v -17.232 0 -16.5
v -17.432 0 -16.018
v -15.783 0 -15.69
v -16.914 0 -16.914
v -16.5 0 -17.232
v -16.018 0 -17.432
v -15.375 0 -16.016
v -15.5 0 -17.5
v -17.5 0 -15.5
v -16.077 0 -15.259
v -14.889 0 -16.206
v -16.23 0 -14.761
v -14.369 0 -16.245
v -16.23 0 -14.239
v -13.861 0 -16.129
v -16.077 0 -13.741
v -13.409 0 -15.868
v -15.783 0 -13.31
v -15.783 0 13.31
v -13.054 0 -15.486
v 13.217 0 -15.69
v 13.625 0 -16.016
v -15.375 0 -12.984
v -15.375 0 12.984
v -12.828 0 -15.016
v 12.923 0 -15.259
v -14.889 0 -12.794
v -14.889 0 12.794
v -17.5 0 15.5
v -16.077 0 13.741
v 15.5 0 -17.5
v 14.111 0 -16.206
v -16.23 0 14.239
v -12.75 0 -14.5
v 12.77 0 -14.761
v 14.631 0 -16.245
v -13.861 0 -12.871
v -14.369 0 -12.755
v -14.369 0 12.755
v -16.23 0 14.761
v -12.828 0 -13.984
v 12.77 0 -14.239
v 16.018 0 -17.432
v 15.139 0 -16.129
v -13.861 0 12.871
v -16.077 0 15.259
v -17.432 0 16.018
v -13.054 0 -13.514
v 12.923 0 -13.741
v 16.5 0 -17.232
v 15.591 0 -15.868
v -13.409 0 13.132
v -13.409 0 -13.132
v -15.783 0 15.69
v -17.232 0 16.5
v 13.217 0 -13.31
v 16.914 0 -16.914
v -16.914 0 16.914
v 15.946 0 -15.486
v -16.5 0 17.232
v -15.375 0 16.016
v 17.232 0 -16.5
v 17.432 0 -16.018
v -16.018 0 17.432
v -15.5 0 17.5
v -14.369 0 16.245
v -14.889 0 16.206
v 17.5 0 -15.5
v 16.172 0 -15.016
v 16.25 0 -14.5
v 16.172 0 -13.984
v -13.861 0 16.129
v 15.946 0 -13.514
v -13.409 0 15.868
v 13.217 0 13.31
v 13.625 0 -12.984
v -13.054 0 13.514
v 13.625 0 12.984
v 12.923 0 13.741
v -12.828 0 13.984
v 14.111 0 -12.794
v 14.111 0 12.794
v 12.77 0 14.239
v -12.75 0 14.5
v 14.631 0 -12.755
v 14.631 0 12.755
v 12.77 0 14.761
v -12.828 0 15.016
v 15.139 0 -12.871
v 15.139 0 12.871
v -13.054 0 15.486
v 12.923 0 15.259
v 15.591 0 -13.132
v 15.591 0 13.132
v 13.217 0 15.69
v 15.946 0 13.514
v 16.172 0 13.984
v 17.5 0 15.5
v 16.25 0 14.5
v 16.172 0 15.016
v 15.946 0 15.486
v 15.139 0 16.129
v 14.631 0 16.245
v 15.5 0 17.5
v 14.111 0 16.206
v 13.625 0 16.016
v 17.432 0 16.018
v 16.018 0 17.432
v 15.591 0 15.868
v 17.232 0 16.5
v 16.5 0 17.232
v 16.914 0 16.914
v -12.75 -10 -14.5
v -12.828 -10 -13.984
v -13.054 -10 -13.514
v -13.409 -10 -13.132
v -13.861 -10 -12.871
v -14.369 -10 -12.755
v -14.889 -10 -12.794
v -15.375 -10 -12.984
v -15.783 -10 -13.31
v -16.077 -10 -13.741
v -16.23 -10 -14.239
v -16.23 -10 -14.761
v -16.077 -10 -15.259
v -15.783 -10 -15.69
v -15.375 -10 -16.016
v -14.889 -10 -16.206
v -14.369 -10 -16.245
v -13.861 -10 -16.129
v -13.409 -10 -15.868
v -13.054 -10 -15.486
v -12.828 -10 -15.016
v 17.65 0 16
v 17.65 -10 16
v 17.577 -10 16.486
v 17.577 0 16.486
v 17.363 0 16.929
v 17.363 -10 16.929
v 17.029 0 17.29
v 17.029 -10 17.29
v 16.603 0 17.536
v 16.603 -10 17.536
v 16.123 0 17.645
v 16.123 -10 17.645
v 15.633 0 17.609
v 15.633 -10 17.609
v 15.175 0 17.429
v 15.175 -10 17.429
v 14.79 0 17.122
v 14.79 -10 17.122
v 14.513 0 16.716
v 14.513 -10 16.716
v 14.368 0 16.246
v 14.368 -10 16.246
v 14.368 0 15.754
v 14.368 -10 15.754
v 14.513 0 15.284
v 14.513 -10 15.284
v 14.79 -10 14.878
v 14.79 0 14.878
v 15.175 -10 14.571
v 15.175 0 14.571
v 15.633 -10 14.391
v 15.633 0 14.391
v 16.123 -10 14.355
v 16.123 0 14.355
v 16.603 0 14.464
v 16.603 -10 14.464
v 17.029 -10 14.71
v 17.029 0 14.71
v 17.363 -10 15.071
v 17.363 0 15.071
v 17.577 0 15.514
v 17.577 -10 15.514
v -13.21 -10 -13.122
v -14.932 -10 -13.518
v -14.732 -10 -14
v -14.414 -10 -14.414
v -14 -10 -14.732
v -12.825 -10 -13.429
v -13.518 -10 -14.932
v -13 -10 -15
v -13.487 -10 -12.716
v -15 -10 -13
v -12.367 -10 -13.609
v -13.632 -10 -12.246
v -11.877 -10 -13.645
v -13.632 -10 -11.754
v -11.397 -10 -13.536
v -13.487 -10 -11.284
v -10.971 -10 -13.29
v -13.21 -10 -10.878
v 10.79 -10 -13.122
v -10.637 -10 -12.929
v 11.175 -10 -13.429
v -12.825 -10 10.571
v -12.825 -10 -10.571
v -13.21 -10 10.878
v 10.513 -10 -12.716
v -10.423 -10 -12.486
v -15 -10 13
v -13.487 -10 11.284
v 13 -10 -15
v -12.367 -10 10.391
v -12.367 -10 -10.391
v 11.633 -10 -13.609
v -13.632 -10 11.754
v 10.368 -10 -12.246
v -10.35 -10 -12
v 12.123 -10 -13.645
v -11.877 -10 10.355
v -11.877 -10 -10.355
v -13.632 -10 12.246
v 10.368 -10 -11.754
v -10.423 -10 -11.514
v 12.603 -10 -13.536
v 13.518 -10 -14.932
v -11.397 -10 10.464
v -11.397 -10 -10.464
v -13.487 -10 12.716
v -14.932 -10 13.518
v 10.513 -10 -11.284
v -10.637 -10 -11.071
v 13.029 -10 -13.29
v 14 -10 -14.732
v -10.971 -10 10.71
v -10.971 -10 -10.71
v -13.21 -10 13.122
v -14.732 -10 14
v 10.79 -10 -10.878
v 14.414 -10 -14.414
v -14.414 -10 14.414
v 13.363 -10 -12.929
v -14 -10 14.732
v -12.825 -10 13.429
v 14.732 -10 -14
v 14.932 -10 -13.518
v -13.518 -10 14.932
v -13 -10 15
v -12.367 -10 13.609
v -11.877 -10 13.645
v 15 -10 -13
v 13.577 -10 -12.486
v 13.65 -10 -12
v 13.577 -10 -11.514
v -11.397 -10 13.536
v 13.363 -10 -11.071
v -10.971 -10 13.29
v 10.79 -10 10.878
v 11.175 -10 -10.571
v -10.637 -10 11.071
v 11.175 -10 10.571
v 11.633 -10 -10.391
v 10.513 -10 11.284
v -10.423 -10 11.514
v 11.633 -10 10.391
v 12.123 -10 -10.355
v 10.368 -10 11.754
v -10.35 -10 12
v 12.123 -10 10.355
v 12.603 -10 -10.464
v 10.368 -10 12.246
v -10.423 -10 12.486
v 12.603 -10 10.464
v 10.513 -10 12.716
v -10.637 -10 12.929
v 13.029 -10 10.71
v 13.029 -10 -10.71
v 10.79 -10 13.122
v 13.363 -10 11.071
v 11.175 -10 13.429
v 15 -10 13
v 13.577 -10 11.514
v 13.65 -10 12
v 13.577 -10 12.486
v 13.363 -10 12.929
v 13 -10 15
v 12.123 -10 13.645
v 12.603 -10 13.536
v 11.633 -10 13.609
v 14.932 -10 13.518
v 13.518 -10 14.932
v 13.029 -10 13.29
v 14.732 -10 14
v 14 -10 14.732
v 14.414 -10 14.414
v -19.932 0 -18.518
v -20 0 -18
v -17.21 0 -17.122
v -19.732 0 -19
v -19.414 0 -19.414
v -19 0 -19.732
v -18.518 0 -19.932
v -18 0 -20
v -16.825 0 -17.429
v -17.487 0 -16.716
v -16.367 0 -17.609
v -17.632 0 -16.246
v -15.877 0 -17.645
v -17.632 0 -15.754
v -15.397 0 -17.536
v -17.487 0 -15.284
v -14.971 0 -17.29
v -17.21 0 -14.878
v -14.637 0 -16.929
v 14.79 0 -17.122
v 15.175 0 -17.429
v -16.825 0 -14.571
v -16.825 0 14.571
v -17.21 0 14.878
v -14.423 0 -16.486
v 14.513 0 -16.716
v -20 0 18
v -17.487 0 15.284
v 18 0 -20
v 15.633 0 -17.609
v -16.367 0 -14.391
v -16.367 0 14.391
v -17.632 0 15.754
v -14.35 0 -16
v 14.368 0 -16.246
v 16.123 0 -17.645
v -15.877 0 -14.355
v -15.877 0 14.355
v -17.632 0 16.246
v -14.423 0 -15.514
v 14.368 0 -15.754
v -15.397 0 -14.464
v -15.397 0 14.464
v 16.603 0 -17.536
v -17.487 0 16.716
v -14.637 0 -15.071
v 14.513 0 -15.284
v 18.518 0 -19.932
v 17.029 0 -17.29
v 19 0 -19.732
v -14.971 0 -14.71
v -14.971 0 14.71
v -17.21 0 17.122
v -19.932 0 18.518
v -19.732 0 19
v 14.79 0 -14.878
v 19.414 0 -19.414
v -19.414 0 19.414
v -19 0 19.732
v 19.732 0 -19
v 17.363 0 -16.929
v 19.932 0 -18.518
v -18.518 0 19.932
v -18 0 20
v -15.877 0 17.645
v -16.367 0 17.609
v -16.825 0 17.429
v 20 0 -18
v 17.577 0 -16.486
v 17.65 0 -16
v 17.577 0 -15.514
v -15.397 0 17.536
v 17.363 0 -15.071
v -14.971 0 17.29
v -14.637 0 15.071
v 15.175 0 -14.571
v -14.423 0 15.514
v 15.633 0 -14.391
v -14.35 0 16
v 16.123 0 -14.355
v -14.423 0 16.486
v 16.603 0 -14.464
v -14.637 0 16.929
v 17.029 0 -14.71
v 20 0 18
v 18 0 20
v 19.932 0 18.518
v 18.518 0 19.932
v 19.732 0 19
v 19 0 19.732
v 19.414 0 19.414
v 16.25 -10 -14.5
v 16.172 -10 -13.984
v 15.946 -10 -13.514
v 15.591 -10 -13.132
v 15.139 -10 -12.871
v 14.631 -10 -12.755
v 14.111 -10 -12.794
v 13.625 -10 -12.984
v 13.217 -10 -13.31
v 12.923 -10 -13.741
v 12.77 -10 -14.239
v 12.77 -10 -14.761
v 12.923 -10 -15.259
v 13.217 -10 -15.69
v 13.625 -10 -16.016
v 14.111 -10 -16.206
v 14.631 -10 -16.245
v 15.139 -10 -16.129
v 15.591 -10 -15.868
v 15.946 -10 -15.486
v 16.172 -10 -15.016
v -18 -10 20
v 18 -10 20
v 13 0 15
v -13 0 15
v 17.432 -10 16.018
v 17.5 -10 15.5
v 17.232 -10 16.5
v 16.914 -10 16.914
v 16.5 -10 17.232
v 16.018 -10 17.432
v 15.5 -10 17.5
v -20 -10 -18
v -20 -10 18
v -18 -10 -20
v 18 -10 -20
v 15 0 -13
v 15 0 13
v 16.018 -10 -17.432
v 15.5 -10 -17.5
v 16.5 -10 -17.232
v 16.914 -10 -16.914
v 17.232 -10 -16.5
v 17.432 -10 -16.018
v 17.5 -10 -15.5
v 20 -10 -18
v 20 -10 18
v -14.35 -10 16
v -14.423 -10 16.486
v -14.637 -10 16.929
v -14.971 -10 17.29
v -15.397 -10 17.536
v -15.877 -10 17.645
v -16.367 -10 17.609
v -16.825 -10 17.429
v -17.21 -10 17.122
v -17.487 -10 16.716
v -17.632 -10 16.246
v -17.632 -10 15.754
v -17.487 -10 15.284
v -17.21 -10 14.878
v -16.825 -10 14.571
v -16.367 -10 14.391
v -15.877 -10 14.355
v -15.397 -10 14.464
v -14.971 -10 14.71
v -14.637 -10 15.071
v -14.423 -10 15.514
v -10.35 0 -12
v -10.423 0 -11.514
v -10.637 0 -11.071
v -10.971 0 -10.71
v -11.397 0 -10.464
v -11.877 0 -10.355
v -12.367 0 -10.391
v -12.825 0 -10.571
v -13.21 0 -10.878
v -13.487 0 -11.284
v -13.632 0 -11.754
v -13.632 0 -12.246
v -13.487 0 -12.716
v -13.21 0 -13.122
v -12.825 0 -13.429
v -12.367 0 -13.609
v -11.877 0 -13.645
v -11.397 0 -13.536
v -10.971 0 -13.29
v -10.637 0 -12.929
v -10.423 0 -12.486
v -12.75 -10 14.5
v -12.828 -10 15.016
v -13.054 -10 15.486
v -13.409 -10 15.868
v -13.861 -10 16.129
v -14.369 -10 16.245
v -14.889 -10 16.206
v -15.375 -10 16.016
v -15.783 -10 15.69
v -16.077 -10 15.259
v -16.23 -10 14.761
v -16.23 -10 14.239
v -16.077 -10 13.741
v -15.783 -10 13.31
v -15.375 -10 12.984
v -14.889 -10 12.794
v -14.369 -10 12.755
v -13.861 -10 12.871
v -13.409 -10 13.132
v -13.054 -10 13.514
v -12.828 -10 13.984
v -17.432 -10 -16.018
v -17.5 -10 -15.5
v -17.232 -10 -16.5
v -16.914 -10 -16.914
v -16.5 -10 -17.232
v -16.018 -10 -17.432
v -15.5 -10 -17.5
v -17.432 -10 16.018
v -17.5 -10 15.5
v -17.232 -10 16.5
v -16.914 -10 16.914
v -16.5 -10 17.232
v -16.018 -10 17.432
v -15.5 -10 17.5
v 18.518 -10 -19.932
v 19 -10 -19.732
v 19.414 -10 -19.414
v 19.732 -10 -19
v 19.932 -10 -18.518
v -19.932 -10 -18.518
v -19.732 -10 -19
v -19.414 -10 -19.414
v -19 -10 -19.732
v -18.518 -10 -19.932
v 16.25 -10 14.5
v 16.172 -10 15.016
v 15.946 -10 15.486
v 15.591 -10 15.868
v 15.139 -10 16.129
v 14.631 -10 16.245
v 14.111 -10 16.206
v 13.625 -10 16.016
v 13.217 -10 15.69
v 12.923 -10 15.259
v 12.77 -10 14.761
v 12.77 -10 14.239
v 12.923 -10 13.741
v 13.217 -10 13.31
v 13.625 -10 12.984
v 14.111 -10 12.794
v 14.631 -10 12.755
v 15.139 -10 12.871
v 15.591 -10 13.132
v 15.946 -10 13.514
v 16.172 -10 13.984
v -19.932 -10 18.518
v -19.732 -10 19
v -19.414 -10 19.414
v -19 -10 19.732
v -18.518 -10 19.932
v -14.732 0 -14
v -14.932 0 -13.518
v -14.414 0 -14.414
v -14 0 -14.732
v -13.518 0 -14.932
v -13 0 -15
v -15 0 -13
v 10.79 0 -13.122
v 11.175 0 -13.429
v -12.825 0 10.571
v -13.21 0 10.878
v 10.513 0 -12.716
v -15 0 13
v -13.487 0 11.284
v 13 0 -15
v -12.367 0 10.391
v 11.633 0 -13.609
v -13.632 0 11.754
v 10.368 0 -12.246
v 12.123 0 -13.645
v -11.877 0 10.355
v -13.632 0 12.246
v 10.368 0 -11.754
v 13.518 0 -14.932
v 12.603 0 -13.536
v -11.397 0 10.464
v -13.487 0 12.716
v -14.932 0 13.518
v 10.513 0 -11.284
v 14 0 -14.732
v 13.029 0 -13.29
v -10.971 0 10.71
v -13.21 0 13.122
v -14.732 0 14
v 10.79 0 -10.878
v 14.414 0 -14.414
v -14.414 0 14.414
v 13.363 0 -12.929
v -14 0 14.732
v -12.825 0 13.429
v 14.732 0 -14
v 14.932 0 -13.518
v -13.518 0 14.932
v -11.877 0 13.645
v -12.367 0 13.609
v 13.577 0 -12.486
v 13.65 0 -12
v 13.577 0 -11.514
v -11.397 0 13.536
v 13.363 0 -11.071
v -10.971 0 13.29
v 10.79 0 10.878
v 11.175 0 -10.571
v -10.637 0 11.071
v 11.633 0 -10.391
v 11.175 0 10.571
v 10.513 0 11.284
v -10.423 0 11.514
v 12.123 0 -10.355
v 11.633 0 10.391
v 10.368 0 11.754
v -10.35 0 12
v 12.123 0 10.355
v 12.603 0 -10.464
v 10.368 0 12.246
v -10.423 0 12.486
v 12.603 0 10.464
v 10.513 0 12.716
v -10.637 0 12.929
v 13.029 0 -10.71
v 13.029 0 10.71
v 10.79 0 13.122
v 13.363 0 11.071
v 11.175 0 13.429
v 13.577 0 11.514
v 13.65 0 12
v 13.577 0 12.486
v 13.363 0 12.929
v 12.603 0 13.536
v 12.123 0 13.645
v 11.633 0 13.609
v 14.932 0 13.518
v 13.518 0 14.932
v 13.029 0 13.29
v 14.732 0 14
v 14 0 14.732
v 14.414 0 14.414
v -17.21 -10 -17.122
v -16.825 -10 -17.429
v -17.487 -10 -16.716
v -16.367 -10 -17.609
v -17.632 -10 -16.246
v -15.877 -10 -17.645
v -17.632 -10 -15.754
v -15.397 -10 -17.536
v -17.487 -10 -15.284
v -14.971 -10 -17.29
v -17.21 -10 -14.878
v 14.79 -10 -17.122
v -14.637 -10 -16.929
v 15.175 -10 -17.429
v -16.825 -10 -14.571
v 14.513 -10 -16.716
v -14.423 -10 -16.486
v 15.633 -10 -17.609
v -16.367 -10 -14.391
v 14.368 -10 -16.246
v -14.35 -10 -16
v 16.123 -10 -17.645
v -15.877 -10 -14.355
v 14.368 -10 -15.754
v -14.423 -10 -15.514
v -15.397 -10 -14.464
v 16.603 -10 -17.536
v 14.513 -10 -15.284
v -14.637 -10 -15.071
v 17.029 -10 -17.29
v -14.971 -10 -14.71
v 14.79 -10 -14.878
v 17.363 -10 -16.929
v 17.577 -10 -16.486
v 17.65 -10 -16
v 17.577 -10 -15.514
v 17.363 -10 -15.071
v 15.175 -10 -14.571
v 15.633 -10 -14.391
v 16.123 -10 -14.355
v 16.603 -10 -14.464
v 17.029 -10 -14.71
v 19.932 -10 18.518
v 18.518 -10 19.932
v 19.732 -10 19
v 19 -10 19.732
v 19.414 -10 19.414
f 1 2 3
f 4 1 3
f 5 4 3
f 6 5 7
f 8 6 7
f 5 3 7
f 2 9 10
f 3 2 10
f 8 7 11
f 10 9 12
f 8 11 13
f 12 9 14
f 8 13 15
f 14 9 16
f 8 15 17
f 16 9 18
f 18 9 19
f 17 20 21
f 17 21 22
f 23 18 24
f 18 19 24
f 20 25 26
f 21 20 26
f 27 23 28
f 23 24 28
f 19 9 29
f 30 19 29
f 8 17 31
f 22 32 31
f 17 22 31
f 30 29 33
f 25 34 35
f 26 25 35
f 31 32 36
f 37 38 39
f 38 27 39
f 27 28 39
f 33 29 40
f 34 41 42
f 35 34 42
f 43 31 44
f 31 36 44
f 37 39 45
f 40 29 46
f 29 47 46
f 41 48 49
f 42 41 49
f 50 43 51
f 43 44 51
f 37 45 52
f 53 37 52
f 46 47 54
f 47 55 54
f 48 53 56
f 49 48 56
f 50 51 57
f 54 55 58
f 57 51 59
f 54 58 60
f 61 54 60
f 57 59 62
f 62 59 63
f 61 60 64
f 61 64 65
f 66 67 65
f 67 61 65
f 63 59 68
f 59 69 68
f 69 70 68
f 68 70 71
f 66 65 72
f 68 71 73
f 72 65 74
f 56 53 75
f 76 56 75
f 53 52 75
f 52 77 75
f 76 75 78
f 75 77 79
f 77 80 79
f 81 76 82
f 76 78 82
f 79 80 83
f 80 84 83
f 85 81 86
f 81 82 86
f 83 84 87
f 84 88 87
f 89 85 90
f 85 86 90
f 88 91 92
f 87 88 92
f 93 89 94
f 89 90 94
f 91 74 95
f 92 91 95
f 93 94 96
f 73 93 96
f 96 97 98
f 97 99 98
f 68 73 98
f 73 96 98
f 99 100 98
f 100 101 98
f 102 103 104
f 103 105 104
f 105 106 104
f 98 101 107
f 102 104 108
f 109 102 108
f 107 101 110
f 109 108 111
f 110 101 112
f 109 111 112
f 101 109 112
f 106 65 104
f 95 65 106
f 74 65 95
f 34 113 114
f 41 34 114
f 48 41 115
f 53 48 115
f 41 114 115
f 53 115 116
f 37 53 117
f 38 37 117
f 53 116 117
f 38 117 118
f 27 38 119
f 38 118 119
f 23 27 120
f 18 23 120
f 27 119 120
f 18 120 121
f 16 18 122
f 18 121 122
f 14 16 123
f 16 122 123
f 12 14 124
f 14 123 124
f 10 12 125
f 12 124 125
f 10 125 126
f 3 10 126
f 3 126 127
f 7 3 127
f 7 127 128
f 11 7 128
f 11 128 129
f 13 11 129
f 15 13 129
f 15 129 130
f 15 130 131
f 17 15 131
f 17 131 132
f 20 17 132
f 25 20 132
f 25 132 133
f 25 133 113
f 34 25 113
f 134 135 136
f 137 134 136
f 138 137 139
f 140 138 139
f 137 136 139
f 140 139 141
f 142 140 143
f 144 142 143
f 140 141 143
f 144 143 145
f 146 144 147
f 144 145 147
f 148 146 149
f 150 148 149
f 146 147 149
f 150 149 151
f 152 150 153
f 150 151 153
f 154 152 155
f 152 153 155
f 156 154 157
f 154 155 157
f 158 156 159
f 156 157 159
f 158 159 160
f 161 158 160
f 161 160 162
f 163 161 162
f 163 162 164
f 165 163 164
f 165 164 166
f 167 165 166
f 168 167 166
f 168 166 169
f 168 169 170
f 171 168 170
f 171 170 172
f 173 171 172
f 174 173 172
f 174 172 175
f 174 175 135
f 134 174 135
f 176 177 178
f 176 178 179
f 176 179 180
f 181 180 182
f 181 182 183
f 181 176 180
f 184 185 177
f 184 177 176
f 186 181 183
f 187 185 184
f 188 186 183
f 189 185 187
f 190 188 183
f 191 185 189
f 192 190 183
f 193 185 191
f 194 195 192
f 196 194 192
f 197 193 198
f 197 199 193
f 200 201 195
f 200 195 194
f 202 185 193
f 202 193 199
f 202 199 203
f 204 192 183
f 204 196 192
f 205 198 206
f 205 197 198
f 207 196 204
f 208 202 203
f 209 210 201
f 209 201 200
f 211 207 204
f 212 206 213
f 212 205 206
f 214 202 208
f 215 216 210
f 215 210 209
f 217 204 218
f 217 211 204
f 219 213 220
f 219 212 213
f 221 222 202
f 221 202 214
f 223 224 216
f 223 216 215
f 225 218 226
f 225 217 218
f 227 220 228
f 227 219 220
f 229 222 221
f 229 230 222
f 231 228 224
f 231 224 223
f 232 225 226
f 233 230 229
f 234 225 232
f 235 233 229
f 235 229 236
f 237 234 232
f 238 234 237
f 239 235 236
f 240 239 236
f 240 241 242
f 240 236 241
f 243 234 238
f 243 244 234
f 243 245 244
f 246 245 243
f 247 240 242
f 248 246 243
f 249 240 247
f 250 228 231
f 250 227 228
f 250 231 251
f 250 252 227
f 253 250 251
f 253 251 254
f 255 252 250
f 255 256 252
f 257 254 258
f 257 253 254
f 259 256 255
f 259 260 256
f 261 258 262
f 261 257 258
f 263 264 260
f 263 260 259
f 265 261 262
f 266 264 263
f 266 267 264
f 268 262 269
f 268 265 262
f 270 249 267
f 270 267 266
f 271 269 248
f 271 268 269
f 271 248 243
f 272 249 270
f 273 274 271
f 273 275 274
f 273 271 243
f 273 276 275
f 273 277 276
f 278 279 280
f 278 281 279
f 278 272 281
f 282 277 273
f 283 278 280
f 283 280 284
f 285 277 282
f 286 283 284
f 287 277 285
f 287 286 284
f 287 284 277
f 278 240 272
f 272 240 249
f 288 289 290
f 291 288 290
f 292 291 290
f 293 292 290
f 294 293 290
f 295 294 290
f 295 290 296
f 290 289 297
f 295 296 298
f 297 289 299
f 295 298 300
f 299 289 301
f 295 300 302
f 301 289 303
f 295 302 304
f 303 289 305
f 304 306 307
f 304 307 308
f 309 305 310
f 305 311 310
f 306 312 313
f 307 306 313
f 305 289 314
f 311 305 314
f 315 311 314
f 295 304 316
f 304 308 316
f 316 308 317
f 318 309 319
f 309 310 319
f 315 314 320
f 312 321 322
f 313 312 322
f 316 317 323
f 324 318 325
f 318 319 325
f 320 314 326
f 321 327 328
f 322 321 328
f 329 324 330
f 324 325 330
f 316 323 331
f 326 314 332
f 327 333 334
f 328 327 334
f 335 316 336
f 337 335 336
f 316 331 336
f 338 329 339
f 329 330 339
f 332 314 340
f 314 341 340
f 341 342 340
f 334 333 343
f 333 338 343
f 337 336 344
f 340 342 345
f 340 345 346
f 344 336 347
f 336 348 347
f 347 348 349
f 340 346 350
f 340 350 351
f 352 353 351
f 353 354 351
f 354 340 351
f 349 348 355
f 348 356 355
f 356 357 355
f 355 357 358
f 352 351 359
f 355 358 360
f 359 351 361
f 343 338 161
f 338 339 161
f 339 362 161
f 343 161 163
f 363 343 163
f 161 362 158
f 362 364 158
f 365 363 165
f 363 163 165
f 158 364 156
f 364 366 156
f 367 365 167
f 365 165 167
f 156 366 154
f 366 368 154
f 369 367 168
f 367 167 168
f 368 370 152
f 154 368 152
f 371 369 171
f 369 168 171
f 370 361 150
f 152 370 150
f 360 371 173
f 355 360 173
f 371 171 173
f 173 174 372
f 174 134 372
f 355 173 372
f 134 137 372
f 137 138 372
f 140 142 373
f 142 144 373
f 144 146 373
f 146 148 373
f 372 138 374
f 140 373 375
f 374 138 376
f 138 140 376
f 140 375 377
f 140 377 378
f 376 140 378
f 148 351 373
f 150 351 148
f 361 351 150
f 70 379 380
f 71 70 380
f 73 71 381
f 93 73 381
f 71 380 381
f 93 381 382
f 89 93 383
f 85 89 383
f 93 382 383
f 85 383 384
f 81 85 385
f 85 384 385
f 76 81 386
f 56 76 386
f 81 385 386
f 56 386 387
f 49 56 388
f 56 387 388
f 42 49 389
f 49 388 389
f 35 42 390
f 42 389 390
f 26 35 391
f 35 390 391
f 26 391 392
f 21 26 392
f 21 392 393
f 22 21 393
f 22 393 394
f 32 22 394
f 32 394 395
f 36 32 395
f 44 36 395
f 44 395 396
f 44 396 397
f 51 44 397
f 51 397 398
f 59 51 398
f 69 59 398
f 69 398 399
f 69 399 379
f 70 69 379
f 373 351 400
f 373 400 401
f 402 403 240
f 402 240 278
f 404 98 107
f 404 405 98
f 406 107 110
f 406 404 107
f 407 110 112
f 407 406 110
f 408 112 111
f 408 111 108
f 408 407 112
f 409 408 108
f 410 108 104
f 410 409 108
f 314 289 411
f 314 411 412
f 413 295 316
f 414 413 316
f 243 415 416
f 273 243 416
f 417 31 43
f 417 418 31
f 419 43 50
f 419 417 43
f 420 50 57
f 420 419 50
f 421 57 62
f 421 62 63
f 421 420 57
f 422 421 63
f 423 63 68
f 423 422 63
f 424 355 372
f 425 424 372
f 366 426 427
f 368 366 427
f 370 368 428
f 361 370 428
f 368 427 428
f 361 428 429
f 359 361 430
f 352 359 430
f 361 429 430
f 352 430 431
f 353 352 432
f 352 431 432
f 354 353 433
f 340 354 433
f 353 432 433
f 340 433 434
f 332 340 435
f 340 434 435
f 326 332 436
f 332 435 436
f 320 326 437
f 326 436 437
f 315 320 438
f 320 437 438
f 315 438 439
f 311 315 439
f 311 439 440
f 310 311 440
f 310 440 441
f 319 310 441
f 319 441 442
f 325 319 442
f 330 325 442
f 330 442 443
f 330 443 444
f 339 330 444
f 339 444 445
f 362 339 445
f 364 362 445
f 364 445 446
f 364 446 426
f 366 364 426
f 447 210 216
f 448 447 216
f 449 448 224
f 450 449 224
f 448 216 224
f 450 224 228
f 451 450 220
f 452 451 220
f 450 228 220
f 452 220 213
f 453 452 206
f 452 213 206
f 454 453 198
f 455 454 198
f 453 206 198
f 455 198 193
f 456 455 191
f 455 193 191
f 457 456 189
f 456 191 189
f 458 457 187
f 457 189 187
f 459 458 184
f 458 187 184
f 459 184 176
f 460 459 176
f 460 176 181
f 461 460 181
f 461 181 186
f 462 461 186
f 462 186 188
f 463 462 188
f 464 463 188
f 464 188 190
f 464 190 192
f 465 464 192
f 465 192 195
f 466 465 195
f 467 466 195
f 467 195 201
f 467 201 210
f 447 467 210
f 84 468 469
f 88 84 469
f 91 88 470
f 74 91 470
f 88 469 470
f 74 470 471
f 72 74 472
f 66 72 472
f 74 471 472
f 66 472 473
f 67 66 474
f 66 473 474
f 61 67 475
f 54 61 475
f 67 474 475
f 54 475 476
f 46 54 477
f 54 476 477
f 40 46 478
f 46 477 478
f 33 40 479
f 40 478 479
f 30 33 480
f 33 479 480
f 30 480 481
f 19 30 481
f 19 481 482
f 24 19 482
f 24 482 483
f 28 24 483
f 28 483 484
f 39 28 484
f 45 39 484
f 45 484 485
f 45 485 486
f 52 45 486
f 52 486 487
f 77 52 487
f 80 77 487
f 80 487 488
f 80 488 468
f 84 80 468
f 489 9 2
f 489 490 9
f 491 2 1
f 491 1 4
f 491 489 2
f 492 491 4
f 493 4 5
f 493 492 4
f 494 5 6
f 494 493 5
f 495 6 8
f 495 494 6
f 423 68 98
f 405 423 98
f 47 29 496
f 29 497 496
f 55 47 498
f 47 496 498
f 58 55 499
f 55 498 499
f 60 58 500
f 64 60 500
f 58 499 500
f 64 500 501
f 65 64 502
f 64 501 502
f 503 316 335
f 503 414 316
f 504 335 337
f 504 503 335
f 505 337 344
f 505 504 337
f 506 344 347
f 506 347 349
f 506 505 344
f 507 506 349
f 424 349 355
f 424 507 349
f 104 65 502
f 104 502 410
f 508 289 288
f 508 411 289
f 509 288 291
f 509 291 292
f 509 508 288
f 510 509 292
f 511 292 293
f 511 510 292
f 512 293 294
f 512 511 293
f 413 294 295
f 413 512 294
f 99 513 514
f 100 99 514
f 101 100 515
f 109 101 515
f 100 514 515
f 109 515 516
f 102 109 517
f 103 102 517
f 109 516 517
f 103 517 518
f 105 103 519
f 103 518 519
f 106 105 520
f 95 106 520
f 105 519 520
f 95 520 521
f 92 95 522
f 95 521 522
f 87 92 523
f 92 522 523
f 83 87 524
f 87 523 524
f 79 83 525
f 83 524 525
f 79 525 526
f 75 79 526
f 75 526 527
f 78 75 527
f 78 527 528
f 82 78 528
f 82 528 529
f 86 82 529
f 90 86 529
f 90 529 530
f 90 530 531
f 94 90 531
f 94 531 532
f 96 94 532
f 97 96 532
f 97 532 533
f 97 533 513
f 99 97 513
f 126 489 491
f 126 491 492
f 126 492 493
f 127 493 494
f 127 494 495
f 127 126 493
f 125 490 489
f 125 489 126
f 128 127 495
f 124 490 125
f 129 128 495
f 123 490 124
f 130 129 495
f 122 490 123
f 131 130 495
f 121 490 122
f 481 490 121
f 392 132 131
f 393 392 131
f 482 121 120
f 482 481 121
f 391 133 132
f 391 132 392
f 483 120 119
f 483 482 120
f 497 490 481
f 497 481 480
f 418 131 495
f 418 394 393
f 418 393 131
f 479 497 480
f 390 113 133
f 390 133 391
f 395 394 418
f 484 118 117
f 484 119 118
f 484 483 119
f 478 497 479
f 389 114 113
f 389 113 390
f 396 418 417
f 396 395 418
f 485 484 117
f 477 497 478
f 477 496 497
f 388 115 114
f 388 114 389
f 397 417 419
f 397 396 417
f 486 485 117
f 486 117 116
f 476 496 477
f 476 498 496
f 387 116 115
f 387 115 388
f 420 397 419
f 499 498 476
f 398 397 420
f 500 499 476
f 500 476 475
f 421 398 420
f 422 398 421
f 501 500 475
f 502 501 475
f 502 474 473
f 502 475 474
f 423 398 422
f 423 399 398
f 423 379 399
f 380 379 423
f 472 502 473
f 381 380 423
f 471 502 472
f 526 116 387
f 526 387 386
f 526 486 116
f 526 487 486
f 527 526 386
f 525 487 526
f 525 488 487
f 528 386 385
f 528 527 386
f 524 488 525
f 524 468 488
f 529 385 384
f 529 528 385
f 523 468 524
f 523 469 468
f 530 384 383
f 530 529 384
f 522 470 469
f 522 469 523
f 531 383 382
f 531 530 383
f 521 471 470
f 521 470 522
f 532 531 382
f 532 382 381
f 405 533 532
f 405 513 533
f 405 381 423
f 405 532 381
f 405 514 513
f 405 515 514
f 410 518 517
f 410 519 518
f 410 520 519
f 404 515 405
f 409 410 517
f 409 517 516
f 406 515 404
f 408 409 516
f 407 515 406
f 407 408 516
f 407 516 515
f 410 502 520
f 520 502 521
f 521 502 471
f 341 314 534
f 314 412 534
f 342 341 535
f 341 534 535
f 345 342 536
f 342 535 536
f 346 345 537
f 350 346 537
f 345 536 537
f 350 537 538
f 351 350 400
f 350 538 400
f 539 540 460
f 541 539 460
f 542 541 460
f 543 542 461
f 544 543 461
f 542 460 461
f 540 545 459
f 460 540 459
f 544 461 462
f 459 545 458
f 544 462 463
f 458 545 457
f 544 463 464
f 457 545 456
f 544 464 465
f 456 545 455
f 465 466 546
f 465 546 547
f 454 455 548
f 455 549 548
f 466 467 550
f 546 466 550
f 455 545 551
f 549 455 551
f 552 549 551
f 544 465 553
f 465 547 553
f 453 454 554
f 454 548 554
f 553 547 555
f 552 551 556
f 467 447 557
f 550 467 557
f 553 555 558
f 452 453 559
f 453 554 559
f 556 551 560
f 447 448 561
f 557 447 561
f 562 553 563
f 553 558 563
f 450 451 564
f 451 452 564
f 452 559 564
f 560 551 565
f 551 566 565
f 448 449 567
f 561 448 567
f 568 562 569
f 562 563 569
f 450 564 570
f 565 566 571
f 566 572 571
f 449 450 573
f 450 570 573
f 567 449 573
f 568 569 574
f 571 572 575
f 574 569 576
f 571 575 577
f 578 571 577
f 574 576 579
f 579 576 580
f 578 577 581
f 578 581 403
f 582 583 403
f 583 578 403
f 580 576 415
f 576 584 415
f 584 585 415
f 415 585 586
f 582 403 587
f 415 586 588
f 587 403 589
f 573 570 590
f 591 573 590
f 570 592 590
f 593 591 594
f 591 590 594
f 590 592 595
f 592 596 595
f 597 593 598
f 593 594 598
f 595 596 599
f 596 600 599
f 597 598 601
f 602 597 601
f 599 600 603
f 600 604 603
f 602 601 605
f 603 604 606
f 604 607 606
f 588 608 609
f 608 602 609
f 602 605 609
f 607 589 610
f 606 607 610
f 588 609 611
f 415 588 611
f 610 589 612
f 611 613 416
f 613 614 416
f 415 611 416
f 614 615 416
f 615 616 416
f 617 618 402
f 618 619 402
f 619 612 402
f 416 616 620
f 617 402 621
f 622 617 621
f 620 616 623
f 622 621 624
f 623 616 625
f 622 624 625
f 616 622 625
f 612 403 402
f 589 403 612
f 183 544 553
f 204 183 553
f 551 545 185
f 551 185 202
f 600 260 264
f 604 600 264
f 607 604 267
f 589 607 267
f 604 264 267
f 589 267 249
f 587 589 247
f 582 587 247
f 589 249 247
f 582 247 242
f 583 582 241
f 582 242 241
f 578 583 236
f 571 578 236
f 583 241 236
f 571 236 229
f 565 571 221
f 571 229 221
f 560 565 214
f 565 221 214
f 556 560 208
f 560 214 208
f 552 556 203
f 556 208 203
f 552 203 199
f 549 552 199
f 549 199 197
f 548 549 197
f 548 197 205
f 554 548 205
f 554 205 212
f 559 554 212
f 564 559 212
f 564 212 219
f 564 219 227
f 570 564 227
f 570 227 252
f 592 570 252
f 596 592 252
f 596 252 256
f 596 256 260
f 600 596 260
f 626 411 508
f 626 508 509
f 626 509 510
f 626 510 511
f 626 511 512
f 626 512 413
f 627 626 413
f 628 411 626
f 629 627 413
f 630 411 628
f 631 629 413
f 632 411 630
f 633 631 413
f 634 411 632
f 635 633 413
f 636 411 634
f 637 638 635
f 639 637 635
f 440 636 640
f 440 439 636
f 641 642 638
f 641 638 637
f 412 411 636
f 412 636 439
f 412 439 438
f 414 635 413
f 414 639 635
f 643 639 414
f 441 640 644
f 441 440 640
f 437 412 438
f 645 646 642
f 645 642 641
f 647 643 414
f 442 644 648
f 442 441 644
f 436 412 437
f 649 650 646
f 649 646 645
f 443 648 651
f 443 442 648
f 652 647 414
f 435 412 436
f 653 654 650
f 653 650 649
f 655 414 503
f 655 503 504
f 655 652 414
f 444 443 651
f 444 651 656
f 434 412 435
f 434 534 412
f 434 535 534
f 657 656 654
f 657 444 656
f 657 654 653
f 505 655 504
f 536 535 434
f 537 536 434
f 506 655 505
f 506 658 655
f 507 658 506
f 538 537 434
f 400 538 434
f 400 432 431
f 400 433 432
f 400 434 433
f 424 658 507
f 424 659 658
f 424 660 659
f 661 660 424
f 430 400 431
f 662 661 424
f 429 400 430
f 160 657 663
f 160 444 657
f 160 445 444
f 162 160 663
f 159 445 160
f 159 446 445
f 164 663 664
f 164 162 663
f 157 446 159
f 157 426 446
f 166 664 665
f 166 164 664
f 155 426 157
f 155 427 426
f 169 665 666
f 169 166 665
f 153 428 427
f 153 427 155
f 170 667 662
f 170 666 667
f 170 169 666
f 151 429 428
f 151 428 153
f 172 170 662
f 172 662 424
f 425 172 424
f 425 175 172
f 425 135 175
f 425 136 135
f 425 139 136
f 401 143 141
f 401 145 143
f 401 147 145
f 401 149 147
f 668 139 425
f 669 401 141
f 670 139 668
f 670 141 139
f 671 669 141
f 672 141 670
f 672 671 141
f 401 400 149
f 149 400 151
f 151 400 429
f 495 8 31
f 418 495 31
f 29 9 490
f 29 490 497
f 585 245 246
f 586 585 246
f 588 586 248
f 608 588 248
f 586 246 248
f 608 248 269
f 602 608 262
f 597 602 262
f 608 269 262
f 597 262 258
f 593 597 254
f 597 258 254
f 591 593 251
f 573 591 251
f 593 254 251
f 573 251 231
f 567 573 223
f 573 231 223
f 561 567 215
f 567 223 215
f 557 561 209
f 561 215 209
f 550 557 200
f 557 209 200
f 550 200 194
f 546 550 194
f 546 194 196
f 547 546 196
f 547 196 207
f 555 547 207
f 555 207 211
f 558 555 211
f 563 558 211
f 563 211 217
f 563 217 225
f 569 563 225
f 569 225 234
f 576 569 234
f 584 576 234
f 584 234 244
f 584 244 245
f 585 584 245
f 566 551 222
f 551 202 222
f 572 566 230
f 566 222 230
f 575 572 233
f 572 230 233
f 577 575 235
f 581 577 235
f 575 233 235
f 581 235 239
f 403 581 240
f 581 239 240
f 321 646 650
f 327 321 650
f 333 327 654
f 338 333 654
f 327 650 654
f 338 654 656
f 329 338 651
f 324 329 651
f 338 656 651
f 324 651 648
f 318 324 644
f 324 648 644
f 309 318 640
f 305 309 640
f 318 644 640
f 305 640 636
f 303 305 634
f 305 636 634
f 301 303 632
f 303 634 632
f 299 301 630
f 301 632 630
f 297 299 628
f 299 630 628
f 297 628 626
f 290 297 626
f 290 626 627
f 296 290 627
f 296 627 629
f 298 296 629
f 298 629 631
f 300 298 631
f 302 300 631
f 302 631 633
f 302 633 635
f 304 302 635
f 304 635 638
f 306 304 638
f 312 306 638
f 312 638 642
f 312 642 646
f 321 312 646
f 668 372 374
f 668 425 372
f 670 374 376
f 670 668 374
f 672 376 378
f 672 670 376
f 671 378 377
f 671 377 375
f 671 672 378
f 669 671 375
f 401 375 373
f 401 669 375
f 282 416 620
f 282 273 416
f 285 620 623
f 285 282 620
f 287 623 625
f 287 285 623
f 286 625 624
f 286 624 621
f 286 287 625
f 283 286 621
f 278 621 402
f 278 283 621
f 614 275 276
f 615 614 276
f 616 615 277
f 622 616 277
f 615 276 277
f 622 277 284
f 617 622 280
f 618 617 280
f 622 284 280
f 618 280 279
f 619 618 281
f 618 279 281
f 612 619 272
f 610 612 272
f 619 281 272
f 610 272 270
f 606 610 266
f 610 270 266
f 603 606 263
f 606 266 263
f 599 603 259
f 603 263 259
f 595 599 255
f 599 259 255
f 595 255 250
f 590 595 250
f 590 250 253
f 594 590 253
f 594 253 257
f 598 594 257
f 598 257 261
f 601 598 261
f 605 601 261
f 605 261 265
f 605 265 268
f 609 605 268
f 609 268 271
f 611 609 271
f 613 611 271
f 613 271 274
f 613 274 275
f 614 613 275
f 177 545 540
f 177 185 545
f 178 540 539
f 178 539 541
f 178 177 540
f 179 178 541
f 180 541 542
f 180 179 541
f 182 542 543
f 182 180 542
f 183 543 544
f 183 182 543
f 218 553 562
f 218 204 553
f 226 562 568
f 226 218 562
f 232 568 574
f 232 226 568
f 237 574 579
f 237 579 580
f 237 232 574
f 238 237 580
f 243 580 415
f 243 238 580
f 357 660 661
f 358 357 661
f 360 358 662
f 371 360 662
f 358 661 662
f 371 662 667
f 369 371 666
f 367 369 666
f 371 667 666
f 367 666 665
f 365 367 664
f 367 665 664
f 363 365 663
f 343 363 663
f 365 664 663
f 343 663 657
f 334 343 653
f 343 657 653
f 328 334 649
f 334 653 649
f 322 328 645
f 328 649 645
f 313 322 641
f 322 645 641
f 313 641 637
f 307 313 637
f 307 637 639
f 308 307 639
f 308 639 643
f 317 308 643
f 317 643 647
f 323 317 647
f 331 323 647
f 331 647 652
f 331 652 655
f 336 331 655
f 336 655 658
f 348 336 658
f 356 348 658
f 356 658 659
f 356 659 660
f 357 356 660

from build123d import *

# Parameters (mm, degrees)
F0_W      = 30
F0_H      = 30
F1_DEPTH  = 10
F2_R      = 2
F3_R      = 1.65
F4_DEPTH  = 25
F5_W      = 40
F5_H      = 40
F6_DEPTH  = 10
F7_R      = 2
F8_R      = 1.65
F9_DEPTH  = 25
F10_W     = 35
F10_H     = 35
F11_DEPTH = 10
F12_R     = 2
F13_R     = 1.75
F14_DEPTH = 25


with BuildPart() as f1:
    # F0 (on Front) → F1 (new body)
    with BuildSketch(Plane.XZ):
        Rectangle(F0_W, F0_H)
    extrude(amount=F1_DEPTH)

    # F2
    f2_edges = [f1.edges().sort_by_distance(p)[0] for p in [
        (-15, -5, 15),
        (-15, -5, -15),
        (15, -5, -15),
        (15, -5, 15),
    ]]
    fillet(f2_edges, radius=F2_R)

    # F3 (on face) → F4 (cut)
    with BuildSketch(Plane.XZ.offset(10)):
        with Locations((-12, 12)):
            Circle(F3_R)
        with Locations((12, 12)):
            Circle(F3_R)
        with Locations((12, -12)):
            Circle(F3_R)
        with Locations((-12, -12)):
            Circle(F3_R)
    extrude(amount=-F4_DEPTH, mode=Mode.SUBTRACT)


with BuildPart() as f6:
    # F5 (on Front) → F6 (new body)
    with BuildSketch(Plane.XZ):
        Rectangle(F5_W, F5_H)
    extrude(amount=F6_DEPTH)

    # F7
    f7_edges = [f6.edges().sort_by_distance(p)[0] for p in [
        (-20, -5, 20),
        (-20, -5, -20),
        (20, -5, 20),
        (20, -5, -20),
    ]]
    fillet(f7_edges, radius=F7_R)

    # F8 (on face) → F9 (cut)
    with BuildSketch(Plane.XZ.offset(10)):
        with Locations((-16, 16)):
            Circle(F8_R)
        with Locations((16, 16)):
            Circle(F8_R)
        with Locations((-16, -16)):
            Circle(F8_R)
        with Locations((16, -16)):
            Circle(F8_R)
    extrude(amount=-F9_DEPTH, mode=Mode.SUBTRACT)


with BuildPart() as f11:
    # F10 (on Front) → F11 (new body)
    with BuildSketch(Plane.XZ):
        Rectangle(F10_W, F10_H)
    extrude(amount=F11_DEPTH)

    # F12
    f12_edges = [f11.edges().sort_by_distance(p)[0] for p in [
        (-17.5, -5, 17.5),
        (-17.5, -5, -17.5),
        (17.5, -5, 17.5),
        (17.5, -5, -17.5),
    ]]
    fillet(f12_edges, radius=F12_R)

    # F13 (on face) → F14 (cut)
    with BuildSketch(Plane.XZ.offset(10)):
        with Locations((-14.5, 14.5)):
            Circle(F13_R)
        with Locations((14.5, 14.5)):
            Circle(F13_R)
        with Locations((14.5, -14.5)):
            Circle(F13_R)
        with Locations((-14.5, -14.5)):
            Circle(F13_R)
    extrude(amount=-F14_DEPTH, mode=Mode.SUBTRACT)


solid = Compound([f1.part, f6.part, f11.part])
